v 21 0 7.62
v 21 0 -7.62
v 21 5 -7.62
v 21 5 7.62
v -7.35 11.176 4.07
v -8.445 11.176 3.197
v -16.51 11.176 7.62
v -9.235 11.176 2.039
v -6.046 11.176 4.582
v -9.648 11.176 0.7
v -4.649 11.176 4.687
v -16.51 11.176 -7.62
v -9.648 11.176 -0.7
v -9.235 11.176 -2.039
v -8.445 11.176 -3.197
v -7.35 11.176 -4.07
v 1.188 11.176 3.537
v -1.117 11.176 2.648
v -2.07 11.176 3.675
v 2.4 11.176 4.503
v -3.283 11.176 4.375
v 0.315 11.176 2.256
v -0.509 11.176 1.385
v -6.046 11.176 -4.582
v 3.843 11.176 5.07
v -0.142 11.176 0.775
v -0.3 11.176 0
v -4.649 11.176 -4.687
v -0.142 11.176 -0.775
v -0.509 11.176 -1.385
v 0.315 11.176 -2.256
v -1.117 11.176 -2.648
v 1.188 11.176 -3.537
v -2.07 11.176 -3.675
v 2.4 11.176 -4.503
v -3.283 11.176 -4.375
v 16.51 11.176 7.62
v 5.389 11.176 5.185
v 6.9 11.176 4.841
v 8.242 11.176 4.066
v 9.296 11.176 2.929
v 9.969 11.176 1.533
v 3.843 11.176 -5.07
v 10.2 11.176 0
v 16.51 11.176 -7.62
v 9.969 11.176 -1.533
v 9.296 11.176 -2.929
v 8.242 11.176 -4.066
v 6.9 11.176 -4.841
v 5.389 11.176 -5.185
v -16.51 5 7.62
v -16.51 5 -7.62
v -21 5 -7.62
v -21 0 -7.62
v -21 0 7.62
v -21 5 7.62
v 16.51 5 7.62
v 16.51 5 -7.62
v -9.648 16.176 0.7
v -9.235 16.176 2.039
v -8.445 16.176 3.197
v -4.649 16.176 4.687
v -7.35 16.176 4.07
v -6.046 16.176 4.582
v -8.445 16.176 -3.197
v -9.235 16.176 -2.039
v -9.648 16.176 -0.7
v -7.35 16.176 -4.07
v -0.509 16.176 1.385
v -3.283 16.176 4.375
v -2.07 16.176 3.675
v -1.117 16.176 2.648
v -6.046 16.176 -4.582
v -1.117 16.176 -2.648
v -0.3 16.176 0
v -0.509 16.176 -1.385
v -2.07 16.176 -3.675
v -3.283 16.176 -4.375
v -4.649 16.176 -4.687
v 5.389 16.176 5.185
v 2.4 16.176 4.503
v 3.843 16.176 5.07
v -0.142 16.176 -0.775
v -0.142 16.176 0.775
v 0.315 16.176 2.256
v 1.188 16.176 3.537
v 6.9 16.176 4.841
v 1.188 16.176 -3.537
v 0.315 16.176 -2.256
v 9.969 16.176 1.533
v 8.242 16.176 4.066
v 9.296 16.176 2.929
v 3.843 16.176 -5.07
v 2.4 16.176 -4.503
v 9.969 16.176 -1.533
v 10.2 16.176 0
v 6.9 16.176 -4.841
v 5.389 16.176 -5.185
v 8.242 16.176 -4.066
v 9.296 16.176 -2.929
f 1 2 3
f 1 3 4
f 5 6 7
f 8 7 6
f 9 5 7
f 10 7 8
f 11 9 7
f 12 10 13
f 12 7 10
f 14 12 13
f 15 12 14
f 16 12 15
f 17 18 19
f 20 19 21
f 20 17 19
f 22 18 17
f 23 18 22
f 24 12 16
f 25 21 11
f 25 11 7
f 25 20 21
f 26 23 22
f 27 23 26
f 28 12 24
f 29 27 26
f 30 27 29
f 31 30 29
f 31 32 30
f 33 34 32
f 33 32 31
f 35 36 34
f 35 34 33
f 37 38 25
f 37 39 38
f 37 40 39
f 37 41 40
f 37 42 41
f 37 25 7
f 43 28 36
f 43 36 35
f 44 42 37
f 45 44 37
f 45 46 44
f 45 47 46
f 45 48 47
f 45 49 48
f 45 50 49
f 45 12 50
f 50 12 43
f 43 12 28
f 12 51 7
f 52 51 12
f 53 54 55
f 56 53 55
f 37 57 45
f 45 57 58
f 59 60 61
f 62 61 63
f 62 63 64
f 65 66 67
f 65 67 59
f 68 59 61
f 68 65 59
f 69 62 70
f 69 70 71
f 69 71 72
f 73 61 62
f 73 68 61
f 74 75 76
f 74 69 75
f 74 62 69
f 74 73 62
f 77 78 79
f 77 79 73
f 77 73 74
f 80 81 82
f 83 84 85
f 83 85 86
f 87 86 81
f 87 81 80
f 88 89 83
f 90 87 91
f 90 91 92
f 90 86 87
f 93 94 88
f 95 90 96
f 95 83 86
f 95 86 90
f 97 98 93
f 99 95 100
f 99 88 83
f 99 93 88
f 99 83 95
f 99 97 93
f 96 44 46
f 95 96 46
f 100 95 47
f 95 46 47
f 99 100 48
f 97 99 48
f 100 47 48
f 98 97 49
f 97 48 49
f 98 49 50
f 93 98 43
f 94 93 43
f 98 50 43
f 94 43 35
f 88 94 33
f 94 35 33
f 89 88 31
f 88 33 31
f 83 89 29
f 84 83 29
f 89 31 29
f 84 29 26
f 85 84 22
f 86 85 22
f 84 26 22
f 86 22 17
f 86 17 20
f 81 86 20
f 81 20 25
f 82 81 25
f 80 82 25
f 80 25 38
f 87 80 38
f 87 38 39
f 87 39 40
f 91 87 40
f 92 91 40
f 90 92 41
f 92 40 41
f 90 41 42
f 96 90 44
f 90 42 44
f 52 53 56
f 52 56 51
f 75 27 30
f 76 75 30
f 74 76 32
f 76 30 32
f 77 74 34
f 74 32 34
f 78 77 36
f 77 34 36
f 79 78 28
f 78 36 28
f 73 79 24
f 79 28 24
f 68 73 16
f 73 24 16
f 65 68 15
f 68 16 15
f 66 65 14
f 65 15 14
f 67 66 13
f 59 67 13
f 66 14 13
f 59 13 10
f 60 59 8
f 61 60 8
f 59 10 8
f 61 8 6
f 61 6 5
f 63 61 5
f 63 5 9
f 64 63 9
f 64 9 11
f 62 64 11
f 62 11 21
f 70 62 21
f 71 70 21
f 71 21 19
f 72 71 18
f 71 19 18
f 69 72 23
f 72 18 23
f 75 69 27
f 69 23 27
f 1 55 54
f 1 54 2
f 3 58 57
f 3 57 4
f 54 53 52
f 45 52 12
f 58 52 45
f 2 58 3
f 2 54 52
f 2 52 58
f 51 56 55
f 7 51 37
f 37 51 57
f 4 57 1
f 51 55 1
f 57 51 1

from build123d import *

# Parameters (mm, degrees)
SKETCH1_W           = 33.02
SKETCH1_H           = 15.24
BOSS_EXTRUDE1_DEPTH = 11.176
SKETCH2_R           = 4.7
SKETCH2_R_2         = 5.2
BOSS_EXTRUDE2_DEPTH = 5
SKETCH3_W           = 42
SKETCH3_H           = 15.24
BOSS_EXTRUDE3_DEPTH = 5


with BuildPart() as part:
    # Sketch1 → Boss-Extrude1 (new body)
    with BuildSketch(Plane(origin=(0, 0, 0), x_dir=(1, 0, 0), z_dir=(0, 1, 0))):
        Rectangle(SKETCH1_W, SKETCH1_H)
    extrude(amount=BOSS_EXTRUDE1_DEPTH)

    # Sketch2 → Boss-Extrude2 (add)
    with BuildSketch(Plane(origin=(0, 11.176, 0), x_dir=(1, 0, 0), z_dir=(0, 1, 0))):
        with Locations((-5, 0)):
            Circle(SKETCH2_R)
        with Locations((5, 0)):
            Circle(SKETCH2_R_2)
    extrude(amount=BOSS_EXTRUDE2_DEPTH)

    # Sketch3 → Boss-Extrude3 (add)
    with BuildSketch(Plane.XZ):
        Rectangle(SKETCH3_W, SKETCH3_H)
    extrude(amount=-BOSS_EXTRUDE3_DEPTH)


solid = part.part
